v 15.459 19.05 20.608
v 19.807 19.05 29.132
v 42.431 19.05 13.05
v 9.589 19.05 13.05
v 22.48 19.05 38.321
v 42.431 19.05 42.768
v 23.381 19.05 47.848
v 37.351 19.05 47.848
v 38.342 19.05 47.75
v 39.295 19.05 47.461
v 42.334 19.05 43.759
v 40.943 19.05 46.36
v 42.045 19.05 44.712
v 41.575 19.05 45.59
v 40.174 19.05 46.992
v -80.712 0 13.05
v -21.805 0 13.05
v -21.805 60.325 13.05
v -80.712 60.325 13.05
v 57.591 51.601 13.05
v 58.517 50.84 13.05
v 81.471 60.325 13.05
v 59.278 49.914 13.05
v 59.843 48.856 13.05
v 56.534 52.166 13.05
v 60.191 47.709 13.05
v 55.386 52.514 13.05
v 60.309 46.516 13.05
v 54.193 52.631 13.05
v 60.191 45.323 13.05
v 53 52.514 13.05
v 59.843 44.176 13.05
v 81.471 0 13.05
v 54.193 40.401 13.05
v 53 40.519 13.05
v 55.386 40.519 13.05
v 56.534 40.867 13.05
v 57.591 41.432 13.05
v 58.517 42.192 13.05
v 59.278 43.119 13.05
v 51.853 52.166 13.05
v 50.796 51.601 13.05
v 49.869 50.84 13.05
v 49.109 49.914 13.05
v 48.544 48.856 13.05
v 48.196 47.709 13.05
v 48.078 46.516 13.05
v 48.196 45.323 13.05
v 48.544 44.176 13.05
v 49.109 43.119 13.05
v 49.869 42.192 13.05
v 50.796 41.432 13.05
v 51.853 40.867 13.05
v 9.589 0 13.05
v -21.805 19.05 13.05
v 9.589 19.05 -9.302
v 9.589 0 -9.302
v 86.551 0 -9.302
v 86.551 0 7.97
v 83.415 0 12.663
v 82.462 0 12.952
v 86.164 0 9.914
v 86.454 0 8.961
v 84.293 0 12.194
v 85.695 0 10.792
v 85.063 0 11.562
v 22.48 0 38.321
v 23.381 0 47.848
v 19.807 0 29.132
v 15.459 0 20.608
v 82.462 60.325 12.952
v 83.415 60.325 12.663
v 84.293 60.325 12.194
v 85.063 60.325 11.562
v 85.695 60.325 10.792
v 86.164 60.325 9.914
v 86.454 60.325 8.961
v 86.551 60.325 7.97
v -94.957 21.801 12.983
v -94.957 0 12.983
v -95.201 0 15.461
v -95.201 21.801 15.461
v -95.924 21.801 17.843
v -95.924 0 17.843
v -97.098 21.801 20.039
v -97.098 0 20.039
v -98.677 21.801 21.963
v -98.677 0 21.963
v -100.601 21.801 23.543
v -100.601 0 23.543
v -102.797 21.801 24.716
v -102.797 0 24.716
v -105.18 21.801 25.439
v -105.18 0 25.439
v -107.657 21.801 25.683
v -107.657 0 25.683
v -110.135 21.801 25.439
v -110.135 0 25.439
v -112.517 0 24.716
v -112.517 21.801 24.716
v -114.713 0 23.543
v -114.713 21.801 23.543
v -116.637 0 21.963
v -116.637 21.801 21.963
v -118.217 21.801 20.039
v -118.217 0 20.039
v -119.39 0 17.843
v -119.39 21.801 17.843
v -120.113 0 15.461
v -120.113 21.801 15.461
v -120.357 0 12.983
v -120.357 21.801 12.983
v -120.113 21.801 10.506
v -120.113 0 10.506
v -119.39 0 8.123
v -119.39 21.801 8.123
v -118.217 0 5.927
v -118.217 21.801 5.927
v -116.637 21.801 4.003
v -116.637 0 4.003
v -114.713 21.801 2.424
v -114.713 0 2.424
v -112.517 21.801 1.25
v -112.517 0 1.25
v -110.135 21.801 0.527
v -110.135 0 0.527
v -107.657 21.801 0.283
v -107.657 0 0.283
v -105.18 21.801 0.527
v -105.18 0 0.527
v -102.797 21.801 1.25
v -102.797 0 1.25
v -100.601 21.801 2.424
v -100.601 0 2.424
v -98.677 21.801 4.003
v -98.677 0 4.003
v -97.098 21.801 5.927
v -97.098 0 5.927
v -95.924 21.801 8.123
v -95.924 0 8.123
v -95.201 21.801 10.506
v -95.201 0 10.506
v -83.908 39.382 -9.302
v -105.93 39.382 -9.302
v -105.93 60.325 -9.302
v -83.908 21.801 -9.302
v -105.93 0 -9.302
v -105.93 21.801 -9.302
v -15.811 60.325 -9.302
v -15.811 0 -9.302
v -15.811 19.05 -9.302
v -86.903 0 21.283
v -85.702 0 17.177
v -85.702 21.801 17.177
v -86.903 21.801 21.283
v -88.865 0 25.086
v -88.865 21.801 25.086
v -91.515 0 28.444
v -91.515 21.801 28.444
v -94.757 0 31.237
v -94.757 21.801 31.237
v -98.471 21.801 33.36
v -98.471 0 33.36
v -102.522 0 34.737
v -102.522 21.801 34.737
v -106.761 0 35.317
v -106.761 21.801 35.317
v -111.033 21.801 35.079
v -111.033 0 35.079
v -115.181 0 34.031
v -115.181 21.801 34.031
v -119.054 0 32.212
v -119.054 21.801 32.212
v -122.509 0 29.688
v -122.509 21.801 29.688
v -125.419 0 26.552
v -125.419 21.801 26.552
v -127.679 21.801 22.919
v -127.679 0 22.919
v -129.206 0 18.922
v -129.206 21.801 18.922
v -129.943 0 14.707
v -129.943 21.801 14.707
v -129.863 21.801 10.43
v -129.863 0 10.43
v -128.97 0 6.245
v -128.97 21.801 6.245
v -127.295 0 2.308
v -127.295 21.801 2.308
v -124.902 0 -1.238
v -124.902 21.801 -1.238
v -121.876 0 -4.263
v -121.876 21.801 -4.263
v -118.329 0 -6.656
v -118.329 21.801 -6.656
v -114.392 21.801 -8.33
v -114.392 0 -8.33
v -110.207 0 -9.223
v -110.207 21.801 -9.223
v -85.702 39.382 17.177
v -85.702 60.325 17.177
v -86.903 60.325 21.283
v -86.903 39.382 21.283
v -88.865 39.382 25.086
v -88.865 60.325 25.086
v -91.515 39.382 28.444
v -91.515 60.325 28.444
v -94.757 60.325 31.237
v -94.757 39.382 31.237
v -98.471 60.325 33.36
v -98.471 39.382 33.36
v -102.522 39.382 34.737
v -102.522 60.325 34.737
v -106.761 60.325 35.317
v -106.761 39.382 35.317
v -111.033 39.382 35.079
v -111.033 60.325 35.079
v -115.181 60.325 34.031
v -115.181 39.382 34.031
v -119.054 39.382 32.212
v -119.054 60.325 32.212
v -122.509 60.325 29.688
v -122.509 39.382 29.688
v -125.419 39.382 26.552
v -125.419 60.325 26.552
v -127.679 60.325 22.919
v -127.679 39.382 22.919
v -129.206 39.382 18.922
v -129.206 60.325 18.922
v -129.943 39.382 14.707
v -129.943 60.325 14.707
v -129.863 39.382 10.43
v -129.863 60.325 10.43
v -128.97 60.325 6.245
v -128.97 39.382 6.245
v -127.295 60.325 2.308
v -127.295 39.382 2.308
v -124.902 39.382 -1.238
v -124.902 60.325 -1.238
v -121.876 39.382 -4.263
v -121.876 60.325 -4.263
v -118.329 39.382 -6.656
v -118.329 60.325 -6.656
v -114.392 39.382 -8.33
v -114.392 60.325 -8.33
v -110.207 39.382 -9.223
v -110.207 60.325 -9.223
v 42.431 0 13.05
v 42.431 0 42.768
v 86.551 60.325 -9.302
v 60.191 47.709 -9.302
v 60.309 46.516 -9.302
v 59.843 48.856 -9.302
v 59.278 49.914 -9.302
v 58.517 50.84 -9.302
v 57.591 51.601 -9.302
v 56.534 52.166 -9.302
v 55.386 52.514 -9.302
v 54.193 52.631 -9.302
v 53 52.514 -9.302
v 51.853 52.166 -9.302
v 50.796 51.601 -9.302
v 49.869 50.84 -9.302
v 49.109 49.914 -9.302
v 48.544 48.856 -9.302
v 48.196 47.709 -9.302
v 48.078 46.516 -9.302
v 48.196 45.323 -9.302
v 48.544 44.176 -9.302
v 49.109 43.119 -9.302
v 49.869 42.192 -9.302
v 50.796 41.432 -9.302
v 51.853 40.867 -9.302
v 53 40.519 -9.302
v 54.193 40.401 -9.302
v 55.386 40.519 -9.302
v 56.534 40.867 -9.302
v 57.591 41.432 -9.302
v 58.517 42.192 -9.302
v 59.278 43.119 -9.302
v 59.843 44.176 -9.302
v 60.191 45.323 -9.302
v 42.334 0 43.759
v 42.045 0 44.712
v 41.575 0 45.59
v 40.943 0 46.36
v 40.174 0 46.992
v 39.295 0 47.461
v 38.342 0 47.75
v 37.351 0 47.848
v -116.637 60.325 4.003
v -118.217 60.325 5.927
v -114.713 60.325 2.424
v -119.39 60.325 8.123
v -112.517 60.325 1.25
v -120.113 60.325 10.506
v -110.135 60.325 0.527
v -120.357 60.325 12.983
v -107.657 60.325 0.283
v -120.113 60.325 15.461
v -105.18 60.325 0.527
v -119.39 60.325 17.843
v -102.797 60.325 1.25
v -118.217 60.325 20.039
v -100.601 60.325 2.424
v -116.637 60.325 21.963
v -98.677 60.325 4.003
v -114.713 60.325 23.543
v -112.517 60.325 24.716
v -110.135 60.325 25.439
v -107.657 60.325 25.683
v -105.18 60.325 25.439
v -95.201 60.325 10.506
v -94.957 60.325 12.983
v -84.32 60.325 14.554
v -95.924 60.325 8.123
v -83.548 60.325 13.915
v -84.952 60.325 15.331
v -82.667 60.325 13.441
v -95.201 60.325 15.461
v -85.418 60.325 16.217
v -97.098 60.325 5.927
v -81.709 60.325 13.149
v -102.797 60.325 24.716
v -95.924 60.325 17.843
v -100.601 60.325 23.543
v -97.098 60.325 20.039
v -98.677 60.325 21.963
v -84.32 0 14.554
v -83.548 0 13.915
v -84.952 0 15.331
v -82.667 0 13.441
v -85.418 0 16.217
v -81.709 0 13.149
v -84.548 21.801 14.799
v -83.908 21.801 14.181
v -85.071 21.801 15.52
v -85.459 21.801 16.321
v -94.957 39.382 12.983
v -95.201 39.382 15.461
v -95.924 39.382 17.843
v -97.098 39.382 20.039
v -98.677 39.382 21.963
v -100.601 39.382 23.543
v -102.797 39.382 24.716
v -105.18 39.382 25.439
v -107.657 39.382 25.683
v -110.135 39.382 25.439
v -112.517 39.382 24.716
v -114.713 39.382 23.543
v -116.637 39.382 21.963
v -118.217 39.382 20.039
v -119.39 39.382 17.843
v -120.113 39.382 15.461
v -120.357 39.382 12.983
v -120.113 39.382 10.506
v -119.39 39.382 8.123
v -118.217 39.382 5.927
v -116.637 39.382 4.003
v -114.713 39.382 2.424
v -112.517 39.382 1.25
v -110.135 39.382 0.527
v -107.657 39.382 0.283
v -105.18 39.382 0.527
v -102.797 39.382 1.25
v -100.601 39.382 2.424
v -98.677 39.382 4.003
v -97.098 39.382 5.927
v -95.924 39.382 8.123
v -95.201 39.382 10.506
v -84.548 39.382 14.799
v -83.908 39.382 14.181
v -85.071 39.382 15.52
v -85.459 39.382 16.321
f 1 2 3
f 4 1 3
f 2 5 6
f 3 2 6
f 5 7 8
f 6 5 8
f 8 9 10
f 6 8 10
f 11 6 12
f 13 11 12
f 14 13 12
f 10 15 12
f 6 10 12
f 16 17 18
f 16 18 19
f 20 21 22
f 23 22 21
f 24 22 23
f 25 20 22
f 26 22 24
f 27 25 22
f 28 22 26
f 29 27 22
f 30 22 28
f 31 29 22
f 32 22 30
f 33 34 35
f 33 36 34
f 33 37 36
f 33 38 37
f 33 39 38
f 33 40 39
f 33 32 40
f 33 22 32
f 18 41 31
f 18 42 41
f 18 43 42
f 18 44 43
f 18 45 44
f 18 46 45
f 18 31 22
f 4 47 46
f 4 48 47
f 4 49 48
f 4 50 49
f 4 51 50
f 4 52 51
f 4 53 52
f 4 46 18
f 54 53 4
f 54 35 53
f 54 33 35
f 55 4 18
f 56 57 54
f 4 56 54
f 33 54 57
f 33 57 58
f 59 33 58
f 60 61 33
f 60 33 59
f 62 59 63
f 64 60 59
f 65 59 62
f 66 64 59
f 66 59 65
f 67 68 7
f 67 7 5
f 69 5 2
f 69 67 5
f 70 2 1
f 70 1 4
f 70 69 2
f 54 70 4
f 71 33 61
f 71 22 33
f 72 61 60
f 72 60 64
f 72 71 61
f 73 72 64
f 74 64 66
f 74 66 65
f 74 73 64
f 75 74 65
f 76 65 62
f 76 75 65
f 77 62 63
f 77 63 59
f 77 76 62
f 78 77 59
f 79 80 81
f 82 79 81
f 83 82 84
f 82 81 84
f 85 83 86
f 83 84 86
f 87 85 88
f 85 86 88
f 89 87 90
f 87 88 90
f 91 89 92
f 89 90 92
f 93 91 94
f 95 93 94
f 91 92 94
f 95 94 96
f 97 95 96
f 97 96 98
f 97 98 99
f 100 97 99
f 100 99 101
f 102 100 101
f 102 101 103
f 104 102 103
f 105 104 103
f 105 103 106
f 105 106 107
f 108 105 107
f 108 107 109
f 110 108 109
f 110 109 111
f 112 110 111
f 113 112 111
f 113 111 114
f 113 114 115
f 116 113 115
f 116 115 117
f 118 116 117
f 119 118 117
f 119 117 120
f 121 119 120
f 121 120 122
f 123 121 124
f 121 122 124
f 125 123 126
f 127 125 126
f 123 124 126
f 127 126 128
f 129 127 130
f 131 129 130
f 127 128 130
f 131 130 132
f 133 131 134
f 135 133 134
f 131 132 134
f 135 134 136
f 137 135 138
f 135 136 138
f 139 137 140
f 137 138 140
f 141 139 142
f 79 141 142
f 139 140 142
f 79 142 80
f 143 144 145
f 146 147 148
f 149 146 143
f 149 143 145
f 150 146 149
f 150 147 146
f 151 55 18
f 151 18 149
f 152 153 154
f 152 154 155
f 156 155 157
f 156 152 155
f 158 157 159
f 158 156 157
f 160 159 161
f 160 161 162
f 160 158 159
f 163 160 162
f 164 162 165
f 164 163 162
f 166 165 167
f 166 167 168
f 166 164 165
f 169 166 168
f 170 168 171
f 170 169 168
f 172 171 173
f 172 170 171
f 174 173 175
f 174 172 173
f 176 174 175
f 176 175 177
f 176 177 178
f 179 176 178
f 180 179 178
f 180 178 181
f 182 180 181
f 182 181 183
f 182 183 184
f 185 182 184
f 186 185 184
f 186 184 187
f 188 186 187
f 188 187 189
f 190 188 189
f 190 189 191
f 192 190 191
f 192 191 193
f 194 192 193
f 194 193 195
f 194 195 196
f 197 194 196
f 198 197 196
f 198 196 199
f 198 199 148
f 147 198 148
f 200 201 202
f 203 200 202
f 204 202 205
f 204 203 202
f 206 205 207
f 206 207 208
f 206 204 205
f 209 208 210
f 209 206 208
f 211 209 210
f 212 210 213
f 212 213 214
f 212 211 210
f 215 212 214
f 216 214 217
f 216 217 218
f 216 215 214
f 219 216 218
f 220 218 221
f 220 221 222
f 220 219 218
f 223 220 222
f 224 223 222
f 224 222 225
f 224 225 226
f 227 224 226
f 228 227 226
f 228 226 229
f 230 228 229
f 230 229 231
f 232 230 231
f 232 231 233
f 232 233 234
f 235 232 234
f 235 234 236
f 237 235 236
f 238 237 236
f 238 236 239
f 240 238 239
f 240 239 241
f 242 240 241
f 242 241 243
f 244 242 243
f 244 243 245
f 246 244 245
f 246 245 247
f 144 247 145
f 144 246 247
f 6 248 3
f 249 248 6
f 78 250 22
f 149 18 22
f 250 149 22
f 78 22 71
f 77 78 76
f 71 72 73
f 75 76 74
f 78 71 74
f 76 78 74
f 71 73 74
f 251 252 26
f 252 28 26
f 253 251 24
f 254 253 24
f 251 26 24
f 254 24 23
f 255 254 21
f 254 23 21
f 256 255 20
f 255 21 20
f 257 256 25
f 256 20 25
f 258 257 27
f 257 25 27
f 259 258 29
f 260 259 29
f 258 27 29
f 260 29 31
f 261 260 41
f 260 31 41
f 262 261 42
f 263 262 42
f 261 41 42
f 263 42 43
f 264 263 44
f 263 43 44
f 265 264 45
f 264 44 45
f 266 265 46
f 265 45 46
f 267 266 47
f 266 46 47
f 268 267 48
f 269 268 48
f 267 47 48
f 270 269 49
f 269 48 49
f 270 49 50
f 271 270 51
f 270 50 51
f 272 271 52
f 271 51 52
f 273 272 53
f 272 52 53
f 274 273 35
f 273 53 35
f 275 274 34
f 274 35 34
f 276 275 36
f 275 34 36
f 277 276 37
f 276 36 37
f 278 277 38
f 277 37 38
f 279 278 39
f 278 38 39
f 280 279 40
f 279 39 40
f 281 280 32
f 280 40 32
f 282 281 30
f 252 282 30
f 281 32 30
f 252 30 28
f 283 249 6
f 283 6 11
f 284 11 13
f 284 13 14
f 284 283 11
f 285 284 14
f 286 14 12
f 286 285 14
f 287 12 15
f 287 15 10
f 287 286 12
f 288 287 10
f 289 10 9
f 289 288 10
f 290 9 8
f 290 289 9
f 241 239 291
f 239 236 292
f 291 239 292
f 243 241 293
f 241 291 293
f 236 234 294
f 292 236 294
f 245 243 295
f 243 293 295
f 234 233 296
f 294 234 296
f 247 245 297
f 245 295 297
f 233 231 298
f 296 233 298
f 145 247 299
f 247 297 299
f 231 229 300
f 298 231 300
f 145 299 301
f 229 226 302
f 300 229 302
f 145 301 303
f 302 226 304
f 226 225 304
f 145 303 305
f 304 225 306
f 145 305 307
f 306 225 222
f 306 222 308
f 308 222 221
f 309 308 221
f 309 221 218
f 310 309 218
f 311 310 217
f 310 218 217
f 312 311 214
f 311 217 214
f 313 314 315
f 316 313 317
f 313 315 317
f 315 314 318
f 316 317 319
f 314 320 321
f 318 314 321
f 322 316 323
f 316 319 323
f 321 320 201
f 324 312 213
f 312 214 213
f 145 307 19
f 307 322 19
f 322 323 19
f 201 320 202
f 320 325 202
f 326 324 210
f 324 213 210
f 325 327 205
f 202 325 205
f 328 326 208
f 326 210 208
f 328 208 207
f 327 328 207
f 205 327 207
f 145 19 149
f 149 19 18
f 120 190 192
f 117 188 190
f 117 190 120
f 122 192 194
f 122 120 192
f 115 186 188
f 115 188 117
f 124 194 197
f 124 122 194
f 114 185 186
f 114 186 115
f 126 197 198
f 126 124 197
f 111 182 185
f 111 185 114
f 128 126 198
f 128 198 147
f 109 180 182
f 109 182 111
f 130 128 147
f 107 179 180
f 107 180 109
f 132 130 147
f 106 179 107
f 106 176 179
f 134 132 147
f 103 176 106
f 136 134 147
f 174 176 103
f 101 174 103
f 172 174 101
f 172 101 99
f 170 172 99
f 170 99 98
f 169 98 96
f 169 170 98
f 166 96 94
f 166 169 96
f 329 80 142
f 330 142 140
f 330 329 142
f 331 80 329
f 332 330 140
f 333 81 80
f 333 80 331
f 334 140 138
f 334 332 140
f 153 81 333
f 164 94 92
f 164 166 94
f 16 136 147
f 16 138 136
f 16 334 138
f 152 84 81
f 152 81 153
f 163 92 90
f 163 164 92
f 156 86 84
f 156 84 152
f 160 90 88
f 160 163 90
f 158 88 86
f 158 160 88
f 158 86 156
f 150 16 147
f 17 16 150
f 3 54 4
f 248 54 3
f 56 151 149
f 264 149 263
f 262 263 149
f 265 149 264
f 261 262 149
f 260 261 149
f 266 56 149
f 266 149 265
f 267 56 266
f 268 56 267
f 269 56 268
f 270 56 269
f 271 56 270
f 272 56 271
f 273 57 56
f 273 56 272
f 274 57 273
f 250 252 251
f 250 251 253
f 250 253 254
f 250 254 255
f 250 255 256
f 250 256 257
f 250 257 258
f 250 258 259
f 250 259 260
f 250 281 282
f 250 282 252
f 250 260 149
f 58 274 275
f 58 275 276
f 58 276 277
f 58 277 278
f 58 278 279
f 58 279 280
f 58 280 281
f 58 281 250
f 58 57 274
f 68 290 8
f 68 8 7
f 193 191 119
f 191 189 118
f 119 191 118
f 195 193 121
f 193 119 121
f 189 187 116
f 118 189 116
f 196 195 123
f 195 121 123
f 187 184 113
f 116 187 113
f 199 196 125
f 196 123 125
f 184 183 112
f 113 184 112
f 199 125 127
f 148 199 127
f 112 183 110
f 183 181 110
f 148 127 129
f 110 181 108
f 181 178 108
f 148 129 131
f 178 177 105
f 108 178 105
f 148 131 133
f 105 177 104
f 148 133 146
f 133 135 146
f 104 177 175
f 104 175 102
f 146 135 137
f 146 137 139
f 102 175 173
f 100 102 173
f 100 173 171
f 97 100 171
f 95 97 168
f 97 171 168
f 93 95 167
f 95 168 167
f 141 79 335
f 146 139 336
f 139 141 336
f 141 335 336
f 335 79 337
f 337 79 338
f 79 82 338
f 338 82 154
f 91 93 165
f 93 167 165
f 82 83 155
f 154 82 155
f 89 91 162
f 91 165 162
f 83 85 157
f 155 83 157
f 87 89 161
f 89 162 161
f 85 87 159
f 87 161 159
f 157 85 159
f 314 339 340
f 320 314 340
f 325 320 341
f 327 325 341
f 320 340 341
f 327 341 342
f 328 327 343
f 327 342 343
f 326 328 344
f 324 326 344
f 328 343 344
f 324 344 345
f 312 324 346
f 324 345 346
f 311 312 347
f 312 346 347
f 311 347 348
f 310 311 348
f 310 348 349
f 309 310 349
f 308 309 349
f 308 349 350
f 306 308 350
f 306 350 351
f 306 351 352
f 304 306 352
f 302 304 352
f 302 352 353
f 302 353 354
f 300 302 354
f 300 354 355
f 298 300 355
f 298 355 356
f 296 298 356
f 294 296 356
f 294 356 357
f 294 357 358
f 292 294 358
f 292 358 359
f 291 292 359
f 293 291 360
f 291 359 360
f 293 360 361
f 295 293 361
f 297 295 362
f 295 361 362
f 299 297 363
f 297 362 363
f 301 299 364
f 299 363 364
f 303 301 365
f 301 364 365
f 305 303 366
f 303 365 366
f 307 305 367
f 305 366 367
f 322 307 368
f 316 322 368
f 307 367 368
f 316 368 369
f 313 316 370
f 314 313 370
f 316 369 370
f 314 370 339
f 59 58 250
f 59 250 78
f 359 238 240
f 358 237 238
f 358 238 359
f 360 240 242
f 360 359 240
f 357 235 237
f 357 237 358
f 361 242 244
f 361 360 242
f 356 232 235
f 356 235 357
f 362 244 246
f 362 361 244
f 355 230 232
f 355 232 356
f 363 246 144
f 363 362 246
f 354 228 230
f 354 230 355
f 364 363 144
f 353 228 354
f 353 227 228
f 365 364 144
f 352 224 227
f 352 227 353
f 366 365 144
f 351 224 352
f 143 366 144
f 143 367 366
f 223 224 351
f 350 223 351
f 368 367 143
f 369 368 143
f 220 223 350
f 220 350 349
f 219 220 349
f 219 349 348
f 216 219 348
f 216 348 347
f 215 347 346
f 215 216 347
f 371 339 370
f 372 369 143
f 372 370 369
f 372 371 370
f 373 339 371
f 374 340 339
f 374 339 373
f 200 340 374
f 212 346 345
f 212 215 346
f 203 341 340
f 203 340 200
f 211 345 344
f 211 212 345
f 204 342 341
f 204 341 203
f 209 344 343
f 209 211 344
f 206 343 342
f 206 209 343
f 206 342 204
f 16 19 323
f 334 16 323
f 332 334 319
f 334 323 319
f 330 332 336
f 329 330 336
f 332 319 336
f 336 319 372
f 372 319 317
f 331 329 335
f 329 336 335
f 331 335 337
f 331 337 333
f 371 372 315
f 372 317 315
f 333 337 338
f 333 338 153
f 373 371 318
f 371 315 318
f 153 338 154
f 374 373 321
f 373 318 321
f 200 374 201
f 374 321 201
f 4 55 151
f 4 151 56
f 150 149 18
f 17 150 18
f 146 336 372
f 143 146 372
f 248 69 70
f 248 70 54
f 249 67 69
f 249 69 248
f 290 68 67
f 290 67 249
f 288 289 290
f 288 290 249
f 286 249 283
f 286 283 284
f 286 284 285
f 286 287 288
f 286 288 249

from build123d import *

# Parameters (mm, degrees)
F0_R          = 12.7
F1_DEPTH      = 60.325
F2_DEPTH      = 60.325
F3_DEPTH      = 19.05
F4_DEPTH      = 19.05
F5_W          = 49.9406978488
F5_H          = 17.5811611116
F5_R          = 6.1151869595
F6_DEPTH      = 34.799
F6_DEPTH_BACK = 25.4
F7_R          = 5.0799
F8_R          = 5.08


# Not quite as in the source:
# - a fillet or chamfer is up to 0.001 mm smaller than in the source, because OpenCascade refuses the exact size


with BuildPart() as f1:
    # F0 (on Front) → F1 (new body)
    with BuildSketch(Plane.XZ):
        with BuildLine():
            Line((-21.805210435, 13.050036882), (-85.3053104329, 13.050036882))
            ThreePointArc((-85.3053104329, 13.050036882), (-124.0845666969, 28.1408106558), (-105.929653819, -9.301963118))
            Line((-105.929653819, -9.301963118), (-15.810810435, -9.301963118))
            Line((-15.810810435, -9.301963118), (-21.805210435, 13.050036882))
        make_face()
        with Locations((-107.657210435, 12.9831765975)):
            Circle(F0_R, mode=Mode.SUBTRACT)
    extrude(amount=-F1_DEPTH)


with BuildPart() as f2:
    # F0 (on Front) → F2 (new body)
    with BuildSketch(Plane.XZ):
        Polygon((9.589189565, 13.050036882), (-21.805210435, 13.050036882), (-15.810810435, -9.301963118), (9.589189565, -9.301963118), align=None)
        Polygon((42.431389565, 13.050036882), (9.589189565, 13.050036882), (9.589189565, -9.301963118), (86.551189565, -9.301963118), (86.551189565, 13.050036882), align=None)
    extrude(amount=-F2_DEPTH)

    # F0 (on Front) → F4 (cut)
    with BuildSketch(Plane.XZ):
        Polygon((9.589189565, 13.050036882), (-21.805210435, 13.050036882), (-15.810810435, -9.301963118), (9.589189565, -9.301963118), align=None)
    extrude(amount=-F4_DEPTH, mode=Mode.SUBTRACT)


with BuildPart() as f3:
    # F0 (on Front) → F3 (new body)
    with BuildSketch(Plane.XZ):
        with BuildLine():
            ThreePointArc((23.381389565, 47.848036882), (19.8072049266, 29.1323945161), (9.589189565, 13.050036882))
            Line((9.589189565, 13.050036882), (42.431389565, 13.050036882))
            Line((42.431389565, 13.050036882), (42.431389565, 42.768036882))
            ThreePointArc((42.431389565, 42.768036882), (40.9434920134, 46.3601393304), (37.351389565, 47.848036882))
            Line((37.351389565, 47.848036882), (23.381389565, 47.848036882))
        make_face()
    extrude(amount=-F3_DEPTH)


with BuildPart() as f6_tool:
    # F5 (on face) → F6 (new body, two sides)
    with BuildSketch(Plane.XY.offset(13.050036882)) as f6_sk:
        with Locations((-108.8782735169, 30.5912997574)):
            Rectangle(F5_W, F5_H)
        with Locations((54.1933812201, 46.5162657201)):
            Circle(F5_R)
    extrude(amount=F6_DEPTH)
    extrude(f6_sk.sketch, amount=-F6_DEPTH_BACK)


with BuildPart() as f1_1:
    add(f1.part)

    # F6: cut by f6_tool
    add(f6_tool.part, mode=Mode.SUBTRACT)

    # F7 (radius 5.08 in the source; OpenCascade refuses exactly that, so slightly less here)
    f7_edges = [f1_1.edges().sort_by_distance(p)[0] for p in [
        (-85.30531, 10.90036, 13.050037),
    ]]
    fillet(f7_edges, radius=F7_R)


with BuildPart() as f2_1:
    add(f2.part)

    # F6: cut by f6_tool
    add(f6_tool.part, mode=Mode.SUBTRACT)

    # F8
    f8_edges = [f2_1.edges().sort_by_distance(p)[0] for p in [
        (86.55119, 30.1625, 13.050037),
    ]]
    fillet(f8_edges, radius=F8_R)


solid = Compound([f3.part, f1_1.part, f2_1.part])
